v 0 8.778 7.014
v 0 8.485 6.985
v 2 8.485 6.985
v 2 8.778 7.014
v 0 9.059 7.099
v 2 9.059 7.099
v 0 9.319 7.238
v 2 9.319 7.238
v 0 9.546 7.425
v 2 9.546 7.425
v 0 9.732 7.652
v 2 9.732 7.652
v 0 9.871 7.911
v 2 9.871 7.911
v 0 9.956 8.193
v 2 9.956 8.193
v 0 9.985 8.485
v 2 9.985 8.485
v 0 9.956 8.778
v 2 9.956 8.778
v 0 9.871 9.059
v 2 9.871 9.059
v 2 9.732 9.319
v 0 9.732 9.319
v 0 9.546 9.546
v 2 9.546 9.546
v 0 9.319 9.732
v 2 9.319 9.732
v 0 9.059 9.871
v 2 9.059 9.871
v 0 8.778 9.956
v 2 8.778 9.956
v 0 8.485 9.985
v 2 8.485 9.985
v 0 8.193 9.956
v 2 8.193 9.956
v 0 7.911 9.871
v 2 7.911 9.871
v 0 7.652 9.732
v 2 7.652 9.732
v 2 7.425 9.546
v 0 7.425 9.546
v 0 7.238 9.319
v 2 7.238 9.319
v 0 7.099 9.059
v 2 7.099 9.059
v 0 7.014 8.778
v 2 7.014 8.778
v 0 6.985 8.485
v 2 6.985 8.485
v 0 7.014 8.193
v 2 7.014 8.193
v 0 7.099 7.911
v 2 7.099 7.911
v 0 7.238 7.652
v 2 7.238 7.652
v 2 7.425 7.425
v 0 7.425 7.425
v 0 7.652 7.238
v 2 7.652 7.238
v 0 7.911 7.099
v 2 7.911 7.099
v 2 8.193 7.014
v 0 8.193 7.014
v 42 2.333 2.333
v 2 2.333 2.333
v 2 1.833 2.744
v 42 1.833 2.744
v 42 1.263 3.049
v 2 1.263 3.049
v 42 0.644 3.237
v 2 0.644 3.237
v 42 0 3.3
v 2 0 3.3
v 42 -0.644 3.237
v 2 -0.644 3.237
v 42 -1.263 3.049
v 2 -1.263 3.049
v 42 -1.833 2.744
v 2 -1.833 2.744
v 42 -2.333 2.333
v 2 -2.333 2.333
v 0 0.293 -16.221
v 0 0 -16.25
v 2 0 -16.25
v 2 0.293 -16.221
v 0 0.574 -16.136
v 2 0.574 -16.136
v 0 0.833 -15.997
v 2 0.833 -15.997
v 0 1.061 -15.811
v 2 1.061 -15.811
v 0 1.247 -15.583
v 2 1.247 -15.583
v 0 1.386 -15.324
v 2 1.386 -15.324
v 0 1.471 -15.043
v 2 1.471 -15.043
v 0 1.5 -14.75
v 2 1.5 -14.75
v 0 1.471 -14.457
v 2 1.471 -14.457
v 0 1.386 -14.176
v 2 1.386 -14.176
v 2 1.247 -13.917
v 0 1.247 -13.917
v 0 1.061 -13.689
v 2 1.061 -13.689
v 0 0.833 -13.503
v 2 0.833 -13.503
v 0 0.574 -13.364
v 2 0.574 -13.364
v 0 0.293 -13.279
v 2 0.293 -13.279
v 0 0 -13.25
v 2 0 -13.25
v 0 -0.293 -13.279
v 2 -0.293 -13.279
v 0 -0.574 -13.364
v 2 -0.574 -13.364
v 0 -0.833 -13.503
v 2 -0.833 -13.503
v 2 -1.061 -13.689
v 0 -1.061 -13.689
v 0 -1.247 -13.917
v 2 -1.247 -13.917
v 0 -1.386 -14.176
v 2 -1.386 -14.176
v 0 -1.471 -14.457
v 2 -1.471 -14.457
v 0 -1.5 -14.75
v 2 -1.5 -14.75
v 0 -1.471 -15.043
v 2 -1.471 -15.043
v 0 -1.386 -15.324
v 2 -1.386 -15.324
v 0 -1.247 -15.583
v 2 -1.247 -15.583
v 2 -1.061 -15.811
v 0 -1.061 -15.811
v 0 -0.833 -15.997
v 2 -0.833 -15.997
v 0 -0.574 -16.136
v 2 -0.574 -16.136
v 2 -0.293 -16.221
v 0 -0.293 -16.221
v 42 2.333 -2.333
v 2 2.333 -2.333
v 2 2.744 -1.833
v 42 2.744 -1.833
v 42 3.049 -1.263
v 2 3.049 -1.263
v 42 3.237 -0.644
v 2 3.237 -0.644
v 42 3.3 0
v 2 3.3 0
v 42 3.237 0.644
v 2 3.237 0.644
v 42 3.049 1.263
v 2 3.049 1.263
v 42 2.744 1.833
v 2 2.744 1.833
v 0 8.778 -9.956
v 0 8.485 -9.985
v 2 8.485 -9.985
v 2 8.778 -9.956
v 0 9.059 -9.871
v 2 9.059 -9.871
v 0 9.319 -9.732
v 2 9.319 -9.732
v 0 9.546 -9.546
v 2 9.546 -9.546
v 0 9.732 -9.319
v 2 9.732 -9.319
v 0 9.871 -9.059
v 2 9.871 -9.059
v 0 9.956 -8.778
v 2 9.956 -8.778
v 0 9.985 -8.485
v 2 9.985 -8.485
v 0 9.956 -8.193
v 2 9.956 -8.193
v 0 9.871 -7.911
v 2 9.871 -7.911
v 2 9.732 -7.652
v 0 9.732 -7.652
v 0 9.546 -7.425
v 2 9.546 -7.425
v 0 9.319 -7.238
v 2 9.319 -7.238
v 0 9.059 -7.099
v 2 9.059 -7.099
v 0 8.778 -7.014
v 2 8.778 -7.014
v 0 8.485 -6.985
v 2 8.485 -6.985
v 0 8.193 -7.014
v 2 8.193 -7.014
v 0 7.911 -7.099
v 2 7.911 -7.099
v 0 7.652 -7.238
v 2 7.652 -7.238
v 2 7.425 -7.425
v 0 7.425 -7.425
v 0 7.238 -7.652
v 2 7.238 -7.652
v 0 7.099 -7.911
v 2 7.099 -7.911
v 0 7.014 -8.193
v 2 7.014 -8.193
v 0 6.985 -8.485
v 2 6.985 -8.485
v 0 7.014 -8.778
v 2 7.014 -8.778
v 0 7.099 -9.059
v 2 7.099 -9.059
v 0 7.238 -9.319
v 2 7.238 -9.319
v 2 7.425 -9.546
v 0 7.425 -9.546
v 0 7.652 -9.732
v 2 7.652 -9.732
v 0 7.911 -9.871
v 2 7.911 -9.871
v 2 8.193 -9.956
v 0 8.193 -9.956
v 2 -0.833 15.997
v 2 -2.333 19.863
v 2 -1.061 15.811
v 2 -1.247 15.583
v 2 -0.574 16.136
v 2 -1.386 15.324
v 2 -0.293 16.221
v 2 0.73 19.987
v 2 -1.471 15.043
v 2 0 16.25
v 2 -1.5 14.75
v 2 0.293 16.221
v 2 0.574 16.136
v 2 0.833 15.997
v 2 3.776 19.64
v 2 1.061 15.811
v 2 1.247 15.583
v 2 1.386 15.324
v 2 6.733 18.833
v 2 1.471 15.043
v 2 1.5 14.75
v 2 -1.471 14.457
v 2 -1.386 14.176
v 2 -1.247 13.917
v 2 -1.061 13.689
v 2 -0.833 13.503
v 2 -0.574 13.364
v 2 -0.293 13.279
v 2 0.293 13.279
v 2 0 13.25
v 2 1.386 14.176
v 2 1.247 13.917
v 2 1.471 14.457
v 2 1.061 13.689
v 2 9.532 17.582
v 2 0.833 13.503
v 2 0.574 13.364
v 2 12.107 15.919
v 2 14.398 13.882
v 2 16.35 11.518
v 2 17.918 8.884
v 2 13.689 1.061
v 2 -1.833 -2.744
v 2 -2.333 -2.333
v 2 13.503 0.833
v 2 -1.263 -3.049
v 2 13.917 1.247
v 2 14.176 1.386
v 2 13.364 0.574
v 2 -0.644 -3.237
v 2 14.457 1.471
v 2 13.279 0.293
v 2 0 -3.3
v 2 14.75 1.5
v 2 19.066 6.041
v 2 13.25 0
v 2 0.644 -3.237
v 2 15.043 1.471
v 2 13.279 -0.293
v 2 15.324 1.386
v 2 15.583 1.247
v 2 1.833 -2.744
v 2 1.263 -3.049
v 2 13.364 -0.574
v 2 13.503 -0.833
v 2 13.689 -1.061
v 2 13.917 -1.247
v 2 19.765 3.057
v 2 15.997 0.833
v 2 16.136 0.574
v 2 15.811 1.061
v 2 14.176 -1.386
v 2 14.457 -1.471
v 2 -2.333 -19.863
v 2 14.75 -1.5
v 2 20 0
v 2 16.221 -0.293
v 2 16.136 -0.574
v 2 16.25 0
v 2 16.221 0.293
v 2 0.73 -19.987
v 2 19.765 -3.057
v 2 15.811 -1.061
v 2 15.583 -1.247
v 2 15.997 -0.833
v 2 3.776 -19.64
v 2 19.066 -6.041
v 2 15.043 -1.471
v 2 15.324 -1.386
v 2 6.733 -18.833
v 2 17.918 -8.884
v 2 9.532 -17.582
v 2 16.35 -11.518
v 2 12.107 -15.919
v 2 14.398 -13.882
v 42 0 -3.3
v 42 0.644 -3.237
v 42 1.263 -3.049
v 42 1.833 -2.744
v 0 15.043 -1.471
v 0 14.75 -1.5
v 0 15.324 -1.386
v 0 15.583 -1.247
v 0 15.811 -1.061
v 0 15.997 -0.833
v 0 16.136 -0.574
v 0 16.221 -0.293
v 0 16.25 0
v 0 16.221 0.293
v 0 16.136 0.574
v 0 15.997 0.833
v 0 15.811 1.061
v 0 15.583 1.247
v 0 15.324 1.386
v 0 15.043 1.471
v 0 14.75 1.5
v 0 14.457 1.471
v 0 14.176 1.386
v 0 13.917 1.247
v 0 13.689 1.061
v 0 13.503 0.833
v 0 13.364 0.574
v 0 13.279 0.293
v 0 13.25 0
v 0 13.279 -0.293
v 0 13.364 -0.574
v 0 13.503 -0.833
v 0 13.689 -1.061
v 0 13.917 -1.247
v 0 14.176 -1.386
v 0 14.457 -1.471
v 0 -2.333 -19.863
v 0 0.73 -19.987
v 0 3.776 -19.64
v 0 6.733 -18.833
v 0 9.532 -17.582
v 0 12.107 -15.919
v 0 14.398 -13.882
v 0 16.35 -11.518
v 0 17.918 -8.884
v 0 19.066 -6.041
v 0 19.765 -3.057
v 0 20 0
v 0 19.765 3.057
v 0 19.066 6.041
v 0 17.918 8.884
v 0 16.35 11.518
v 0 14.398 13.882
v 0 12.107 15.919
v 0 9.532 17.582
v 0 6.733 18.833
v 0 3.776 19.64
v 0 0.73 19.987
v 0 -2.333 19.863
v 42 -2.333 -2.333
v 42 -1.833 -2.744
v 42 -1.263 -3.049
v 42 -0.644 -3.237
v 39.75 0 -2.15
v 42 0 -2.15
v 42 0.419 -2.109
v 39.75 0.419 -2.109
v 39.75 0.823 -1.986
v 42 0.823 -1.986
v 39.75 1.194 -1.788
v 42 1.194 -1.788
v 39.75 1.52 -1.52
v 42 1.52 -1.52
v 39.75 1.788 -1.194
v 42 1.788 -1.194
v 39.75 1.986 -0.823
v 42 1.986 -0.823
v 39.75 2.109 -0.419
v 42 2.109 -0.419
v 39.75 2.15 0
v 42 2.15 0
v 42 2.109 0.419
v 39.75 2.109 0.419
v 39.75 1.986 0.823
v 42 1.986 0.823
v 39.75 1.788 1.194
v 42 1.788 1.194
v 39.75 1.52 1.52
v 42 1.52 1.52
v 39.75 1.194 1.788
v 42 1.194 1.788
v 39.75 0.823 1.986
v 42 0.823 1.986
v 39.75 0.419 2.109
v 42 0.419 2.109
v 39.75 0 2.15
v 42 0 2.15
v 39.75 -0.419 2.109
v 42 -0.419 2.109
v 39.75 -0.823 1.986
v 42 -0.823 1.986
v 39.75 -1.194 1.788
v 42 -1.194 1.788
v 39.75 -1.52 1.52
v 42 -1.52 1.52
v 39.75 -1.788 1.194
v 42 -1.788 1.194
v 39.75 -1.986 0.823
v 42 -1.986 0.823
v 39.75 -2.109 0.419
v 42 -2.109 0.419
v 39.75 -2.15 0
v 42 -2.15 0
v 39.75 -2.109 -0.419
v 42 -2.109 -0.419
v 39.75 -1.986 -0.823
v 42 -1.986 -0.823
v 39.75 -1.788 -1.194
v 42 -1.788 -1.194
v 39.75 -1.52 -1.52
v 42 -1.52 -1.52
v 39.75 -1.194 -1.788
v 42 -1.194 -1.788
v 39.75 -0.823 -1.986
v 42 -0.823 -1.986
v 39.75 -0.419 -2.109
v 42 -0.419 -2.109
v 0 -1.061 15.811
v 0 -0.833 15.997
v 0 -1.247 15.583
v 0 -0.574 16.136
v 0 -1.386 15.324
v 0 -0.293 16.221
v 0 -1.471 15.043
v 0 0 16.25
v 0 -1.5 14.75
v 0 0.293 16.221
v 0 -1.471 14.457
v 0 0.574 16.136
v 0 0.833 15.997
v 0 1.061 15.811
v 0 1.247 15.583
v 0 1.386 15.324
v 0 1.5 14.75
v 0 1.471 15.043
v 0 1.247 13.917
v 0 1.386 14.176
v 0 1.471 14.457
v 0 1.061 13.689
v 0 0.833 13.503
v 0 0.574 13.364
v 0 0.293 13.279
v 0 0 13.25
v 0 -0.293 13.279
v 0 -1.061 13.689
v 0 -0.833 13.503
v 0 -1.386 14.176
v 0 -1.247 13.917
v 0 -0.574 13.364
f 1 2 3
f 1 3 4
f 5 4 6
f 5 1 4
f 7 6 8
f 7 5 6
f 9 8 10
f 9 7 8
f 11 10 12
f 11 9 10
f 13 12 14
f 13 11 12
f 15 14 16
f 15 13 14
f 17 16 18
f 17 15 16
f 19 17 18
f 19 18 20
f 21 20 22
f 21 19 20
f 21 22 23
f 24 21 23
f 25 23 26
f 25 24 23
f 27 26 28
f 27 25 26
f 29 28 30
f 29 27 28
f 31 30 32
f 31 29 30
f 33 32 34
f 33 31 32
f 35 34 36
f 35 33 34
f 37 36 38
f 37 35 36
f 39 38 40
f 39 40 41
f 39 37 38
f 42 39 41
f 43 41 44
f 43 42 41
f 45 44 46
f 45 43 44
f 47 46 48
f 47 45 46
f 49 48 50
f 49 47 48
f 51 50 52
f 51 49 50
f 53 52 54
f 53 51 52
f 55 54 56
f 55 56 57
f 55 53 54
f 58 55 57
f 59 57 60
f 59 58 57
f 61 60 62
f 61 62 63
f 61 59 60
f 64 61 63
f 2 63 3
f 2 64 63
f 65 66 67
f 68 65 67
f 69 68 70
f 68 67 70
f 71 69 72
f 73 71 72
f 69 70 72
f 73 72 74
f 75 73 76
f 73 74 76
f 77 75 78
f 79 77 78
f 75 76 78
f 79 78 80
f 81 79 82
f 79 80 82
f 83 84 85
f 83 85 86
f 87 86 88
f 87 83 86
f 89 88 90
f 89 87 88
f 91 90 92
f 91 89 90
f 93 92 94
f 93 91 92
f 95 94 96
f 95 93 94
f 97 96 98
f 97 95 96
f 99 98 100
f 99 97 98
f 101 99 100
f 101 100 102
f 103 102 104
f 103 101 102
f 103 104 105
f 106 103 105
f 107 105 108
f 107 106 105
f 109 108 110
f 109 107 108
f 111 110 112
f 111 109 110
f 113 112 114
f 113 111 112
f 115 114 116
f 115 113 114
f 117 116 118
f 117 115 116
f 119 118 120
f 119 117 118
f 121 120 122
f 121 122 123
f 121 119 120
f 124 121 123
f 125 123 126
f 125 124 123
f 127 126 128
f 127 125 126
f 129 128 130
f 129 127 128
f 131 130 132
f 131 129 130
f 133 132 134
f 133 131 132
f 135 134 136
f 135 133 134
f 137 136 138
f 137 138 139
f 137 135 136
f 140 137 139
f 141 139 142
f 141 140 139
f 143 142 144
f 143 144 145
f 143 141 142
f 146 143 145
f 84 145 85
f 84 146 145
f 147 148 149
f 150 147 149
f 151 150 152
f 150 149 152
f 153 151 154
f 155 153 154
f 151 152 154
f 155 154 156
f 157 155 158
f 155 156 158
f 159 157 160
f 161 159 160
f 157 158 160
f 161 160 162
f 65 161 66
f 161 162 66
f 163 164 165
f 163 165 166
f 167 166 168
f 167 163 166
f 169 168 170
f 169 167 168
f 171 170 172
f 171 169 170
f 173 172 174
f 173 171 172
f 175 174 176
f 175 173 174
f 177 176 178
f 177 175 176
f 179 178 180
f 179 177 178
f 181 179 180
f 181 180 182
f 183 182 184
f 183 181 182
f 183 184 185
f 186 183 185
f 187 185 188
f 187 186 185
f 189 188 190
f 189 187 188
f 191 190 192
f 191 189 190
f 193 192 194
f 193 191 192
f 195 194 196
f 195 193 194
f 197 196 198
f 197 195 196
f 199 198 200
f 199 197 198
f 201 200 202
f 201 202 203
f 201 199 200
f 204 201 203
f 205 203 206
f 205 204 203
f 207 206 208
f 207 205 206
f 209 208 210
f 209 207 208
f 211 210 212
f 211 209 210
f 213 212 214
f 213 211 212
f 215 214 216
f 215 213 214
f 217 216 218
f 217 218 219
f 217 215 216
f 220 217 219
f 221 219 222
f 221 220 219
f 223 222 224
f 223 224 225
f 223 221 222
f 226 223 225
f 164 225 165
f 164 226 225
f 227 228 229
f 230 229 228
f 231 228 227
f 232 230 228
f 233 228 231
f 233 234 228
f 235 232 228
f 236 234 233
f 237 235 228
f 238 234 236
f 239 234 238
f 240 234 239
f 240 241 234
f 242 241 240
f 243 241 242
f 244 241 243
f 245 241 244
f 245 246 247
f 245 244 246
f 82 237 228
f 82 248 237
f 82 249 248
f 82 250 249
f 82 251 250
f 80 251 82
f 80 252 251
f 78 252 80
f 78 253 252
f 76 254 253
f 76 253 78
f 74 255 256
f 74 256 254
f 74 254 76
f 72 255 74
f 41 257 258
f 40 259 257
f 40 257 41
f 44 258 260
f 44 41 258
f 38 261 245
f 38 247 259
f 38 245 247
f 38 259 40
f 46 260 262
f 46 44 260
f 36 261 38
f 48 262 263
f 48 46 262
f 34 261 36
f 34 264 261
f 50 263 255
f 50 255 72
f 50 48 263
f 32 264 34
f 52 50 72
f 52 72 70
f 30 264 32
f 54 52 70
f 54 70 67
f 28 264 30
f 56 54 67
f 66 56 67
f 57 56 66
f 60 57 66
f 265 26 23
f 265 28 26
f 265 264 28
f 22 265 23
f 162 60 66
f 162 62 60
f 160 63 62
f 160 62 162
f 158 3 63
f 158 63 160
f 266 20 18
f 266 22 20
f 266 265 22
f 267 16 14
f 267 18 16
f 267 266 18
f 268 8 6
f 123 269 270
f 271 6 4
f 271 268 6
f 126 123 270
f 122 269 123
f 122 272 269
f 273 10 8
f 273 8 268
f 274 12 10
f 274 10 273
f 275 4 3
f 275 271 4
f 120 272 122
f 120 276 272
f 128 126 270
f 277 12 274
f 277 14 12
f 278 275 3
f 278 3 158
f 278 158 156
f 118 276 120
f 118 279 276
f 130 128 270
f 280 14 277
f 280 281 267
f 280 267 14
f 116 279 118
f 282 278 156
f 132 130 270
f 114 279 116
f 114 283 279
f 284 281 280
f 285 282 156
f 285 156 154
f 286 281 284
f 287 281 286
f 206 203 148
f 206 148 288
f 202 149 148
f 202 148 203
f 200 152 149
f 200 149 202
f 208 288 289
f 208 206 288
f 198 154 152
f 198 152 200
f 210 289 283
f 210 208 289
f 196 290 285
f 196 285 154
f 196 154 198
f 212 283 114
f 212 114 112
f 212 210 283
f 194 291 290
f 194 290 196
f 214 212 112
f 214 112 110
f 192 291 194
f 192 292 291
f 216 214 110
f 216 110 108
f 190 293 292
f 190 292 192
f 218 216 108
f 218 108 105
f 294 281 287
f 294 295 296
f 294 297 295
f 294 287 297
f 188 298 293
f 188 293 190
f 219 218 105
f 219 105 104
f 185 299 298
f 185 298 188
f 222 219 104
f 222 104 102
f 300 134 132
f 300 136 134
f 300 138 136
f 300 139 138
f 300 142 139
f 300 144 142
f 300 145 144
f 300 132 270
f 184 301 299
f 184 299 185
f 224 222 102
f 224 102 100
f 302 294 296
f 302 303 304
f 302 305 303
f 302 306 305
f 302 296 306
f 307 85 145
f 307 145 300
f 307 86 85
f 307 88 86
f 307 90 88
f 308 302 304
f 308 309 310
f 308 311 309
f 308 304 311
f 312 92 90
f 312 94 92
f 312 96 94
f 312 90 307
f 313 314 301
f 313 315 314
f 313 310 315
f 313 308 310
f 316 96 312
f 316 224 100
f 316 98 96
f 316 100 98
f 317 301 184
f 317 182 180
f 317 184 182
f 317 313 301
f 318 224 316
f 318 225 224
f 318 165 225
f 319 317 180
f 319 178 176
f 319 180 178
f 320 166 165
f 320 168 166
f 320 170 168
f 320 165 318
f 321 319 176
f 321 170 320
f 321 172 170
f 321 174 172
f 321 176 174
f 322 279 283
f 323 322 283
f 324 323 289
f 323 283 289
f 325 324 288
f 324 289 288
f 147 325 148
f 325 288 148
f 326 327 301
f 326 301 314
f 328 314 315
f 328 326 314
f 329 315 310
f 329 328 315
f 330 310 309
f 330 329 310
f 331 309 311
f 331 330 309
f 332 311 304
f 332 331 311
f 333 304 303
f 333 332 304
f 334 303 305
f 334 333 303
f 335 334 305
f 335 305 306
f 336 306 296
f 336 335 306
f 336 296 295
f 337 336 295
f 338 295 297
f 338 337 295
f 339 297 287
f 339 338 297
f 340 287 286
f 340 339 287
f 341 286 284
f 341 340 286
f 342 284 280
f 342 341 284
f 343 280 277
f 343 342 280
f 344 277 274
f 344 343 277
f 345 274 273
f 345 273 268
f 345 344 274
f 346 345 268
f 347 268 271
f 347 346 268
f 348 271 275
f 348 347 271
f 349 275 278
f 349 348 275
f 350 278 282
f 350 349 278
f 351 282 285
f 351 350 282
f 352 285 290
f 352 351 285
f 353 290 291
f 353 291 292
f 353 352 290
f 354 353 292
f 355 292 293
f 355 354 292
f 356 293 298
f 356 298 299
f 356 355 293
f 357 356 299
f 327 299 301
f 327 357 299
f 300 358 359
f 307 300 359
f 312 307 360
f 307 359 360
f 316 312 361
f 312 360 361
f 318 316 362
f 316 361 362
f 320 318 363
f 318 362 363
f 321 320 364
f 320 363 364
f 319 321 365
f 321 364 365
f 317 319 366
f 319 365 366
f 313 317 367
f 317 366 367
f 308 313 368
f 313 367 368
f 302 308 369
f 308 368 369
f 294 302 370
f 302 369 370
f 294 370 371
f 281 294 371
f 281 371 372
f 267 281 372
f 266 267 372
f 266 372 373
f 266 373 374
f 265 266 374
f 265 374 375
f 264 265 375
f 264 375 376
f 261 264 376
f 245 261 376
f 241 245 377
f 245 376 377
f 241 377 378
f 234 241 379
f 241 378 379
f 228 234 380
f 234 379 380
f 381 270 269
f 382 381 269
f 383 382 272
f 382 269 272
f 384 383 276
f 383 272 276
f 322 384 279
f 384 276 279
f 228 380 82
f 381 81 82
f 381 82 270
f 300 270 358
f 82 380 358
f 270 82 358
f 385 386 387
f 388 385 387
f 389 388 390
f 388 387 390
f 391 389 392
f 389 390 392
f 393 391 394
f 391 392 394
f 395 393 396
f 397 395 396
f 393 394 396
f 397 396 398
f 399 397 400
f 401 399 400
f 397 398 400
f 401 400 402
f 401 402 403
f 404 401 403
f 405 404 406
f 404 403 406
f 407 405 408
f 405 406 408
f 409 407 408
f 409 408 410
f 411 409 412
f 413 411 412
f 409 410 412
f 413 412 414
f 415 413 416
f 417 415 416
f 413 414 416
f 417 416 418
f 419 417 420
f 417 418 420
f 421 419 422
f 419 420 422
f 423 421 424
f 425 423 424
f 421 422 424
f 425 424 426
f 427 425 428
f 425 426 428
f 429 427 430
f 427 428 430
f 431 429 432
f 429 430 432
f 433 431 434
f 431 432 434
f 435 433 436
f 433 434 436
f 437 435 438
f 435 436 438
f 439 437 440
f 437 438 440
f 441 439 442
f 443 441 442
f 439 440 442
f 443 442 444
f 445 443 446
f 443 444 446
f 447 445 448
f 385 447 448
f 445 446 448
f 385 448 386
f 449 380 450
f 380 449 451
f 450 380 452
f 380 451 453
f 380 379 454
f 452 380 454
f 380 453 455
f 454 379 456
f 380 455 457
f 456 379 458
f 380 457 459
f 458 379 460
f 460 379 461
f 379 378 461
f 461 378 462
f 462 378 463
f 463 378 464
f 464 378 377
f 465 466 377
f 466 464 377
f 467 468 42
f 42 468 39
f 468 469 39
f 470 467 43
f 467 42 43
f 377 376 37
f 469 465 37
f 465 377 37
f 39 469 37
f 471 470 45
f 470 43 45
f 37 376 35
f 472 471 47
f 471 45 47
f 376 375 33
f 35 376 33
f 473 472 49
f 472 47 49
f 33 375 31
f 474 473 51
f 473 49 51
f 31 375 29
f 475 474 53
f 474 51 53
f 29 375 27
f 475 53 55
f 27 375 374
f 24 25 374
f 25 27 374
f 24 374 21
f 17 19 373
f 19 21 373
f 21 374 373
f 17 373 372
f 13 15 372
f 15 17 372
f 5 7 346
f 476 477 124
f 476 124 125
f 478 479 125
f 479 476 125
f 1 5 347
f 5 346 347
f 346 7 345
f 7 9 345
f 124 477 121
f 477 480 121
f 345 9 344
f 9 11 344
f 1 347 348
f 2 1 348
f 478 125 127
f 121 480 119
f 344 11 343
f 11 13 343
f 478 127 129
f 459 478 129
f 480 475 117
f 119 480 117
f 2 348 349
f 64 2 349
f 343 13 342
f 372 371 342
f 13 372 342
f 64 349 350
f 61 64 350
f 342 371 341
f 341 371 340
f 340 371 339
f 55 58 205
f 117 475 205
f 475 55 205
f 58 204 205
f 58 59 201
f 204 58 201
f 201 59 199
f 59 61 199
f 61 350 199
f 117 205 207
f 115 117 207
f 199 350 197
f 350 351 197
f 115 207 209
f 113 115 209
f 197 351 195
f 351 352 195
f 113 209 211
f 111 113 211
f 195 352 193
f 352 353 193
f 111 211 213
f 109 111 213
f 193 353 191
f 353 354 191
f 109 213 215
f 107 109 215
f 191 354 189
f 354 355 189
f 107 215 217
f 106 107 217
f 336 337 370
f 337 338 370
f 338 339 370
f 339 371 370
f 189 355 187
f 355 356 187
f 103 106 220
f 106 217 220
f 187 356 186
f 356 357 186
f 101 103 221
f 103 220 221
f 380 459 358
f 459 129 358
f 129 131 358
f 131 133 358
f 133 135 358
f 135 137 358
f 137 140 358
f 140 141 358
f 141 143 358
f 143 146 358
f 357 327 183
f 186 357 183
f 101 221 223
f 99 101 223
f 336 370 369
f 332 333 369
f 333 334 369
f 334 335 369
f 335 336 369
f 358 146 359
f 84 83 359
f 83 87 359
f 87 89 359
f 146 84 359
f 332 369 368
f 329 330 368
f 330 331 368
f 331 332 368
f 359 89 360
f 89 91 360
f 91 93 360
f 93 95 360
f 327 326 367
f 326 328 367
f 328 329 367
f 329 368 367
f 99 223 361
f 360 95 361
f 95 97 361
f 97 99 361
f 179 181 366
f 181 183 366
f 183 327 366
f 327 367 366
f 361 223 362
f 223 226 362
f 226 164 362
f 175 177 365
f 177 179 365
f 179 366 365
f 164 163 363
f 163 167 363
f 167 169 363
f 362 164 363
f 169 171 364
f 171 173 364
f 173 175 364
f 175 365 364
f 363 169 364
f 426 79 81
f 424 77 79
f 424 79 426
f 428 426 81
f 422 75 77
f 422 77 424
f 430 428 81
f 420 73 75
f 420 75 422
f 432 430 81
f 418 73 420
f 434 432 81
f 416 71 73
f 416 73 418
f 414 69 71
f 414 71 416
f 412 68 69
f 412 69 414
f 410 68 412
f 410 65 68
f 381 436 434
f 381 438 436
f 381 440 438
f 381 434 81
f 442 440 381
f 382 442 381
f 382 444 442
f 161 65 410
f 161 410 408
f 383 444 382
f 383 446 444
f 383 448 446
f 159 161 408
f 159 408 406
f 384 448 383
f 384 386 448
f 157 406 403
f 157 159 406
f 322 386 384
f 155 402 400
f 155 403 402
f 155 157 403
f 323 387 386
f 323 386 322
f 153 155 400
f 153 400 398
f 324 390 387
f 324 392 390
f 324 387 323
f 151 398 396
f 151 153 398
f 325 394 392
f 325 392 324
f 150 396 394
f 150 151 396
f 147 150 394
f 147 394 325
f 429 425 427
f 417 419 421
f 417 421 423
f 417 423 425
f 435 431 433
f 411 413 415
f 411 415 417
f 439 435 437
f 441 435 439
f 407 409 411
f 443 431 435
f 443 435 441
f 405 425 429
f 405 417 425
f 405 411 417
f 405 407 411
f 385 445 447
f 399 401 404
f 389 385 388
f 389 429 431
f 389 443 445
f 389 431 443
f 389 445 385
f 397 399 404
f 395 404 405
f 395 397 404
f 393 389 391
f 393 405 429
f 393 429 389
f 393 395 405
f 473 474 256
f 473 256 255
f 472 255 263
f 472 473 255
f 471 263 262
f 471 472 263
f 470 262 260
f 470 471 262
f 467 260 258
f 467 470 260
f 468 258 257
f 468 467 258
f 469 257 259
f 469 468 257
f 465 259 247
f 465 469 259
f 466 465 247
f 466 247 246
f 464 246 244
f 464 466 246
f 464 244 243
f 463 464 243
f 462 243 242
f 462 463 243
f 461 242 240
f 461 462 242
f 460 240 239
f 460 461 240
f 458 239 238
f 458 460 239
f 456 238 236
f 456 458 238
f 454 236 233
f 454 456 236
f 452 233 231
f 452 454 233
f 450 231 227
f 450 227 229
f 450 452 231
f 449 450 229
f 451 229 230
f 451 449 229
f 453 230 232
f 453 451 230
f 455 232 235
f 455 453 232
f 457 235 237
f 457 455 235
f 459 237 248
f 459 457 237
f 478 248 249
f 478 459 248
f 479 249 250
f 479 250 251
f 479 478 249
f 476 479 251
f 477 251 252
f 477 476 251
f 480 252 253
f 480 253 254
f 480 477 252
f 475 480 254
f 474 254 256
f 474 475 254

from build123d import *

# Parameters (mm, degrees)
SKETCH1_R           = 1.5
BOSS_EXTRUDE1_DEPTH = 2
BOSS_EXTRUDE2_START = 2
SKETCH1_3_W         = 4.666904756
SKETCH1_3_H         = 4.666904756
BOSS_EXTRUDE2_DEPTH = 40
SKETCH3_R           = 2.15
CUT_EXTRUDE1_DEPTH  = 2.25


with BuildPart() as part:
    # Sketch1 → Boss-Extrude1 (new body)
    with BuildSketch(Plane(origin=(0, 0, 0), x_dir=(0, 0, -1), z_dir=(1, 0, 0))):
        with BuildLine():
            Line((-19.86340857, -2.333452378), (19.86340857, -2.333452378))
            ThreePointArc((19.86340857, -2.333452378), (0, 20), (-19.86340857, -2.333452378))
        make_face()
        with Locations((-14.75, 0)):
            Circle(SKETCH1_R, mode=Mode.SUBTRACT)
        with Locations((14.75, 0)):
            Circle(SKETCH1_R, mode=Mode.SUBTRACT)
        with Locations((-8.485281374, 8.485281374)):
            Circle(SKETCH1_R, mode=Mode.SUBTRACT)
        with Locations((8.485281374, 8.485281374)):
            Circle(SKETCH1_R, mode=Mode.SUBTRACT)
        with Locations((0, 14.75)):
            Circle(SKETCH1_R, mode=Mode.SUBTRACT)
    extrude(amount=BOSS_EXTRUDE1_DEPTH)

    # Sketch1<3> → Boss-Extrude2 (add)
    with BuildSketch(Plane(origin=(0, 0, 0), x_dir=(0, 0, -1), z_dir=(1, 0, 0)).offset(BOSS_EXTRUDE2_START)):
        Rectangle(SKETCH1_3_W, SKETCH1_3_H)
        with BuildLine():
            Line((2.333452378, 2.333452378), (2.333452378, -2.333452378))
            ThreePointArc((2.333452378, -2.333452378), (3.048802457, -1.262855327), (3.3, 0))
            ThreePointArc((3.3, 0), (3.048802457, 1.262855327), (2.333452378, 2.333452378))
        make_face()
        with BuildLine():
            ThreePointArc((2.333452378, 2.333452378), (0, 3.3), (-2.333452378, 2.333452378))
            Line((-2.333452378, 2.333452378), (2.333452378, 2.333452378))
        make_face()
        with BuildLine():
            ThreePointArc((-2.333452378, 2.333452378), (-3.3, 0), (-2.333452378, -2.333452378))
            Line((-2.333452378, -2.333452378), (-2.333452378, 2.333452378))
        make_face()
    extrude(amount=BOSS_EXTRUDE2_DEPTH)

    # Sketch3 → Cut-Extrude1 (cut)
    with BuildSketch(Plane(origin=(42, 0, 0), x_dir=(0, 0, -1), z_dir=(1, 0, 0))):
        Circle(SKETCH3_R)
    extrude(amount=-CUT_EXTRUDE1_DEPTH, mode=Mode.SUBTRACT)


solid = part.part
